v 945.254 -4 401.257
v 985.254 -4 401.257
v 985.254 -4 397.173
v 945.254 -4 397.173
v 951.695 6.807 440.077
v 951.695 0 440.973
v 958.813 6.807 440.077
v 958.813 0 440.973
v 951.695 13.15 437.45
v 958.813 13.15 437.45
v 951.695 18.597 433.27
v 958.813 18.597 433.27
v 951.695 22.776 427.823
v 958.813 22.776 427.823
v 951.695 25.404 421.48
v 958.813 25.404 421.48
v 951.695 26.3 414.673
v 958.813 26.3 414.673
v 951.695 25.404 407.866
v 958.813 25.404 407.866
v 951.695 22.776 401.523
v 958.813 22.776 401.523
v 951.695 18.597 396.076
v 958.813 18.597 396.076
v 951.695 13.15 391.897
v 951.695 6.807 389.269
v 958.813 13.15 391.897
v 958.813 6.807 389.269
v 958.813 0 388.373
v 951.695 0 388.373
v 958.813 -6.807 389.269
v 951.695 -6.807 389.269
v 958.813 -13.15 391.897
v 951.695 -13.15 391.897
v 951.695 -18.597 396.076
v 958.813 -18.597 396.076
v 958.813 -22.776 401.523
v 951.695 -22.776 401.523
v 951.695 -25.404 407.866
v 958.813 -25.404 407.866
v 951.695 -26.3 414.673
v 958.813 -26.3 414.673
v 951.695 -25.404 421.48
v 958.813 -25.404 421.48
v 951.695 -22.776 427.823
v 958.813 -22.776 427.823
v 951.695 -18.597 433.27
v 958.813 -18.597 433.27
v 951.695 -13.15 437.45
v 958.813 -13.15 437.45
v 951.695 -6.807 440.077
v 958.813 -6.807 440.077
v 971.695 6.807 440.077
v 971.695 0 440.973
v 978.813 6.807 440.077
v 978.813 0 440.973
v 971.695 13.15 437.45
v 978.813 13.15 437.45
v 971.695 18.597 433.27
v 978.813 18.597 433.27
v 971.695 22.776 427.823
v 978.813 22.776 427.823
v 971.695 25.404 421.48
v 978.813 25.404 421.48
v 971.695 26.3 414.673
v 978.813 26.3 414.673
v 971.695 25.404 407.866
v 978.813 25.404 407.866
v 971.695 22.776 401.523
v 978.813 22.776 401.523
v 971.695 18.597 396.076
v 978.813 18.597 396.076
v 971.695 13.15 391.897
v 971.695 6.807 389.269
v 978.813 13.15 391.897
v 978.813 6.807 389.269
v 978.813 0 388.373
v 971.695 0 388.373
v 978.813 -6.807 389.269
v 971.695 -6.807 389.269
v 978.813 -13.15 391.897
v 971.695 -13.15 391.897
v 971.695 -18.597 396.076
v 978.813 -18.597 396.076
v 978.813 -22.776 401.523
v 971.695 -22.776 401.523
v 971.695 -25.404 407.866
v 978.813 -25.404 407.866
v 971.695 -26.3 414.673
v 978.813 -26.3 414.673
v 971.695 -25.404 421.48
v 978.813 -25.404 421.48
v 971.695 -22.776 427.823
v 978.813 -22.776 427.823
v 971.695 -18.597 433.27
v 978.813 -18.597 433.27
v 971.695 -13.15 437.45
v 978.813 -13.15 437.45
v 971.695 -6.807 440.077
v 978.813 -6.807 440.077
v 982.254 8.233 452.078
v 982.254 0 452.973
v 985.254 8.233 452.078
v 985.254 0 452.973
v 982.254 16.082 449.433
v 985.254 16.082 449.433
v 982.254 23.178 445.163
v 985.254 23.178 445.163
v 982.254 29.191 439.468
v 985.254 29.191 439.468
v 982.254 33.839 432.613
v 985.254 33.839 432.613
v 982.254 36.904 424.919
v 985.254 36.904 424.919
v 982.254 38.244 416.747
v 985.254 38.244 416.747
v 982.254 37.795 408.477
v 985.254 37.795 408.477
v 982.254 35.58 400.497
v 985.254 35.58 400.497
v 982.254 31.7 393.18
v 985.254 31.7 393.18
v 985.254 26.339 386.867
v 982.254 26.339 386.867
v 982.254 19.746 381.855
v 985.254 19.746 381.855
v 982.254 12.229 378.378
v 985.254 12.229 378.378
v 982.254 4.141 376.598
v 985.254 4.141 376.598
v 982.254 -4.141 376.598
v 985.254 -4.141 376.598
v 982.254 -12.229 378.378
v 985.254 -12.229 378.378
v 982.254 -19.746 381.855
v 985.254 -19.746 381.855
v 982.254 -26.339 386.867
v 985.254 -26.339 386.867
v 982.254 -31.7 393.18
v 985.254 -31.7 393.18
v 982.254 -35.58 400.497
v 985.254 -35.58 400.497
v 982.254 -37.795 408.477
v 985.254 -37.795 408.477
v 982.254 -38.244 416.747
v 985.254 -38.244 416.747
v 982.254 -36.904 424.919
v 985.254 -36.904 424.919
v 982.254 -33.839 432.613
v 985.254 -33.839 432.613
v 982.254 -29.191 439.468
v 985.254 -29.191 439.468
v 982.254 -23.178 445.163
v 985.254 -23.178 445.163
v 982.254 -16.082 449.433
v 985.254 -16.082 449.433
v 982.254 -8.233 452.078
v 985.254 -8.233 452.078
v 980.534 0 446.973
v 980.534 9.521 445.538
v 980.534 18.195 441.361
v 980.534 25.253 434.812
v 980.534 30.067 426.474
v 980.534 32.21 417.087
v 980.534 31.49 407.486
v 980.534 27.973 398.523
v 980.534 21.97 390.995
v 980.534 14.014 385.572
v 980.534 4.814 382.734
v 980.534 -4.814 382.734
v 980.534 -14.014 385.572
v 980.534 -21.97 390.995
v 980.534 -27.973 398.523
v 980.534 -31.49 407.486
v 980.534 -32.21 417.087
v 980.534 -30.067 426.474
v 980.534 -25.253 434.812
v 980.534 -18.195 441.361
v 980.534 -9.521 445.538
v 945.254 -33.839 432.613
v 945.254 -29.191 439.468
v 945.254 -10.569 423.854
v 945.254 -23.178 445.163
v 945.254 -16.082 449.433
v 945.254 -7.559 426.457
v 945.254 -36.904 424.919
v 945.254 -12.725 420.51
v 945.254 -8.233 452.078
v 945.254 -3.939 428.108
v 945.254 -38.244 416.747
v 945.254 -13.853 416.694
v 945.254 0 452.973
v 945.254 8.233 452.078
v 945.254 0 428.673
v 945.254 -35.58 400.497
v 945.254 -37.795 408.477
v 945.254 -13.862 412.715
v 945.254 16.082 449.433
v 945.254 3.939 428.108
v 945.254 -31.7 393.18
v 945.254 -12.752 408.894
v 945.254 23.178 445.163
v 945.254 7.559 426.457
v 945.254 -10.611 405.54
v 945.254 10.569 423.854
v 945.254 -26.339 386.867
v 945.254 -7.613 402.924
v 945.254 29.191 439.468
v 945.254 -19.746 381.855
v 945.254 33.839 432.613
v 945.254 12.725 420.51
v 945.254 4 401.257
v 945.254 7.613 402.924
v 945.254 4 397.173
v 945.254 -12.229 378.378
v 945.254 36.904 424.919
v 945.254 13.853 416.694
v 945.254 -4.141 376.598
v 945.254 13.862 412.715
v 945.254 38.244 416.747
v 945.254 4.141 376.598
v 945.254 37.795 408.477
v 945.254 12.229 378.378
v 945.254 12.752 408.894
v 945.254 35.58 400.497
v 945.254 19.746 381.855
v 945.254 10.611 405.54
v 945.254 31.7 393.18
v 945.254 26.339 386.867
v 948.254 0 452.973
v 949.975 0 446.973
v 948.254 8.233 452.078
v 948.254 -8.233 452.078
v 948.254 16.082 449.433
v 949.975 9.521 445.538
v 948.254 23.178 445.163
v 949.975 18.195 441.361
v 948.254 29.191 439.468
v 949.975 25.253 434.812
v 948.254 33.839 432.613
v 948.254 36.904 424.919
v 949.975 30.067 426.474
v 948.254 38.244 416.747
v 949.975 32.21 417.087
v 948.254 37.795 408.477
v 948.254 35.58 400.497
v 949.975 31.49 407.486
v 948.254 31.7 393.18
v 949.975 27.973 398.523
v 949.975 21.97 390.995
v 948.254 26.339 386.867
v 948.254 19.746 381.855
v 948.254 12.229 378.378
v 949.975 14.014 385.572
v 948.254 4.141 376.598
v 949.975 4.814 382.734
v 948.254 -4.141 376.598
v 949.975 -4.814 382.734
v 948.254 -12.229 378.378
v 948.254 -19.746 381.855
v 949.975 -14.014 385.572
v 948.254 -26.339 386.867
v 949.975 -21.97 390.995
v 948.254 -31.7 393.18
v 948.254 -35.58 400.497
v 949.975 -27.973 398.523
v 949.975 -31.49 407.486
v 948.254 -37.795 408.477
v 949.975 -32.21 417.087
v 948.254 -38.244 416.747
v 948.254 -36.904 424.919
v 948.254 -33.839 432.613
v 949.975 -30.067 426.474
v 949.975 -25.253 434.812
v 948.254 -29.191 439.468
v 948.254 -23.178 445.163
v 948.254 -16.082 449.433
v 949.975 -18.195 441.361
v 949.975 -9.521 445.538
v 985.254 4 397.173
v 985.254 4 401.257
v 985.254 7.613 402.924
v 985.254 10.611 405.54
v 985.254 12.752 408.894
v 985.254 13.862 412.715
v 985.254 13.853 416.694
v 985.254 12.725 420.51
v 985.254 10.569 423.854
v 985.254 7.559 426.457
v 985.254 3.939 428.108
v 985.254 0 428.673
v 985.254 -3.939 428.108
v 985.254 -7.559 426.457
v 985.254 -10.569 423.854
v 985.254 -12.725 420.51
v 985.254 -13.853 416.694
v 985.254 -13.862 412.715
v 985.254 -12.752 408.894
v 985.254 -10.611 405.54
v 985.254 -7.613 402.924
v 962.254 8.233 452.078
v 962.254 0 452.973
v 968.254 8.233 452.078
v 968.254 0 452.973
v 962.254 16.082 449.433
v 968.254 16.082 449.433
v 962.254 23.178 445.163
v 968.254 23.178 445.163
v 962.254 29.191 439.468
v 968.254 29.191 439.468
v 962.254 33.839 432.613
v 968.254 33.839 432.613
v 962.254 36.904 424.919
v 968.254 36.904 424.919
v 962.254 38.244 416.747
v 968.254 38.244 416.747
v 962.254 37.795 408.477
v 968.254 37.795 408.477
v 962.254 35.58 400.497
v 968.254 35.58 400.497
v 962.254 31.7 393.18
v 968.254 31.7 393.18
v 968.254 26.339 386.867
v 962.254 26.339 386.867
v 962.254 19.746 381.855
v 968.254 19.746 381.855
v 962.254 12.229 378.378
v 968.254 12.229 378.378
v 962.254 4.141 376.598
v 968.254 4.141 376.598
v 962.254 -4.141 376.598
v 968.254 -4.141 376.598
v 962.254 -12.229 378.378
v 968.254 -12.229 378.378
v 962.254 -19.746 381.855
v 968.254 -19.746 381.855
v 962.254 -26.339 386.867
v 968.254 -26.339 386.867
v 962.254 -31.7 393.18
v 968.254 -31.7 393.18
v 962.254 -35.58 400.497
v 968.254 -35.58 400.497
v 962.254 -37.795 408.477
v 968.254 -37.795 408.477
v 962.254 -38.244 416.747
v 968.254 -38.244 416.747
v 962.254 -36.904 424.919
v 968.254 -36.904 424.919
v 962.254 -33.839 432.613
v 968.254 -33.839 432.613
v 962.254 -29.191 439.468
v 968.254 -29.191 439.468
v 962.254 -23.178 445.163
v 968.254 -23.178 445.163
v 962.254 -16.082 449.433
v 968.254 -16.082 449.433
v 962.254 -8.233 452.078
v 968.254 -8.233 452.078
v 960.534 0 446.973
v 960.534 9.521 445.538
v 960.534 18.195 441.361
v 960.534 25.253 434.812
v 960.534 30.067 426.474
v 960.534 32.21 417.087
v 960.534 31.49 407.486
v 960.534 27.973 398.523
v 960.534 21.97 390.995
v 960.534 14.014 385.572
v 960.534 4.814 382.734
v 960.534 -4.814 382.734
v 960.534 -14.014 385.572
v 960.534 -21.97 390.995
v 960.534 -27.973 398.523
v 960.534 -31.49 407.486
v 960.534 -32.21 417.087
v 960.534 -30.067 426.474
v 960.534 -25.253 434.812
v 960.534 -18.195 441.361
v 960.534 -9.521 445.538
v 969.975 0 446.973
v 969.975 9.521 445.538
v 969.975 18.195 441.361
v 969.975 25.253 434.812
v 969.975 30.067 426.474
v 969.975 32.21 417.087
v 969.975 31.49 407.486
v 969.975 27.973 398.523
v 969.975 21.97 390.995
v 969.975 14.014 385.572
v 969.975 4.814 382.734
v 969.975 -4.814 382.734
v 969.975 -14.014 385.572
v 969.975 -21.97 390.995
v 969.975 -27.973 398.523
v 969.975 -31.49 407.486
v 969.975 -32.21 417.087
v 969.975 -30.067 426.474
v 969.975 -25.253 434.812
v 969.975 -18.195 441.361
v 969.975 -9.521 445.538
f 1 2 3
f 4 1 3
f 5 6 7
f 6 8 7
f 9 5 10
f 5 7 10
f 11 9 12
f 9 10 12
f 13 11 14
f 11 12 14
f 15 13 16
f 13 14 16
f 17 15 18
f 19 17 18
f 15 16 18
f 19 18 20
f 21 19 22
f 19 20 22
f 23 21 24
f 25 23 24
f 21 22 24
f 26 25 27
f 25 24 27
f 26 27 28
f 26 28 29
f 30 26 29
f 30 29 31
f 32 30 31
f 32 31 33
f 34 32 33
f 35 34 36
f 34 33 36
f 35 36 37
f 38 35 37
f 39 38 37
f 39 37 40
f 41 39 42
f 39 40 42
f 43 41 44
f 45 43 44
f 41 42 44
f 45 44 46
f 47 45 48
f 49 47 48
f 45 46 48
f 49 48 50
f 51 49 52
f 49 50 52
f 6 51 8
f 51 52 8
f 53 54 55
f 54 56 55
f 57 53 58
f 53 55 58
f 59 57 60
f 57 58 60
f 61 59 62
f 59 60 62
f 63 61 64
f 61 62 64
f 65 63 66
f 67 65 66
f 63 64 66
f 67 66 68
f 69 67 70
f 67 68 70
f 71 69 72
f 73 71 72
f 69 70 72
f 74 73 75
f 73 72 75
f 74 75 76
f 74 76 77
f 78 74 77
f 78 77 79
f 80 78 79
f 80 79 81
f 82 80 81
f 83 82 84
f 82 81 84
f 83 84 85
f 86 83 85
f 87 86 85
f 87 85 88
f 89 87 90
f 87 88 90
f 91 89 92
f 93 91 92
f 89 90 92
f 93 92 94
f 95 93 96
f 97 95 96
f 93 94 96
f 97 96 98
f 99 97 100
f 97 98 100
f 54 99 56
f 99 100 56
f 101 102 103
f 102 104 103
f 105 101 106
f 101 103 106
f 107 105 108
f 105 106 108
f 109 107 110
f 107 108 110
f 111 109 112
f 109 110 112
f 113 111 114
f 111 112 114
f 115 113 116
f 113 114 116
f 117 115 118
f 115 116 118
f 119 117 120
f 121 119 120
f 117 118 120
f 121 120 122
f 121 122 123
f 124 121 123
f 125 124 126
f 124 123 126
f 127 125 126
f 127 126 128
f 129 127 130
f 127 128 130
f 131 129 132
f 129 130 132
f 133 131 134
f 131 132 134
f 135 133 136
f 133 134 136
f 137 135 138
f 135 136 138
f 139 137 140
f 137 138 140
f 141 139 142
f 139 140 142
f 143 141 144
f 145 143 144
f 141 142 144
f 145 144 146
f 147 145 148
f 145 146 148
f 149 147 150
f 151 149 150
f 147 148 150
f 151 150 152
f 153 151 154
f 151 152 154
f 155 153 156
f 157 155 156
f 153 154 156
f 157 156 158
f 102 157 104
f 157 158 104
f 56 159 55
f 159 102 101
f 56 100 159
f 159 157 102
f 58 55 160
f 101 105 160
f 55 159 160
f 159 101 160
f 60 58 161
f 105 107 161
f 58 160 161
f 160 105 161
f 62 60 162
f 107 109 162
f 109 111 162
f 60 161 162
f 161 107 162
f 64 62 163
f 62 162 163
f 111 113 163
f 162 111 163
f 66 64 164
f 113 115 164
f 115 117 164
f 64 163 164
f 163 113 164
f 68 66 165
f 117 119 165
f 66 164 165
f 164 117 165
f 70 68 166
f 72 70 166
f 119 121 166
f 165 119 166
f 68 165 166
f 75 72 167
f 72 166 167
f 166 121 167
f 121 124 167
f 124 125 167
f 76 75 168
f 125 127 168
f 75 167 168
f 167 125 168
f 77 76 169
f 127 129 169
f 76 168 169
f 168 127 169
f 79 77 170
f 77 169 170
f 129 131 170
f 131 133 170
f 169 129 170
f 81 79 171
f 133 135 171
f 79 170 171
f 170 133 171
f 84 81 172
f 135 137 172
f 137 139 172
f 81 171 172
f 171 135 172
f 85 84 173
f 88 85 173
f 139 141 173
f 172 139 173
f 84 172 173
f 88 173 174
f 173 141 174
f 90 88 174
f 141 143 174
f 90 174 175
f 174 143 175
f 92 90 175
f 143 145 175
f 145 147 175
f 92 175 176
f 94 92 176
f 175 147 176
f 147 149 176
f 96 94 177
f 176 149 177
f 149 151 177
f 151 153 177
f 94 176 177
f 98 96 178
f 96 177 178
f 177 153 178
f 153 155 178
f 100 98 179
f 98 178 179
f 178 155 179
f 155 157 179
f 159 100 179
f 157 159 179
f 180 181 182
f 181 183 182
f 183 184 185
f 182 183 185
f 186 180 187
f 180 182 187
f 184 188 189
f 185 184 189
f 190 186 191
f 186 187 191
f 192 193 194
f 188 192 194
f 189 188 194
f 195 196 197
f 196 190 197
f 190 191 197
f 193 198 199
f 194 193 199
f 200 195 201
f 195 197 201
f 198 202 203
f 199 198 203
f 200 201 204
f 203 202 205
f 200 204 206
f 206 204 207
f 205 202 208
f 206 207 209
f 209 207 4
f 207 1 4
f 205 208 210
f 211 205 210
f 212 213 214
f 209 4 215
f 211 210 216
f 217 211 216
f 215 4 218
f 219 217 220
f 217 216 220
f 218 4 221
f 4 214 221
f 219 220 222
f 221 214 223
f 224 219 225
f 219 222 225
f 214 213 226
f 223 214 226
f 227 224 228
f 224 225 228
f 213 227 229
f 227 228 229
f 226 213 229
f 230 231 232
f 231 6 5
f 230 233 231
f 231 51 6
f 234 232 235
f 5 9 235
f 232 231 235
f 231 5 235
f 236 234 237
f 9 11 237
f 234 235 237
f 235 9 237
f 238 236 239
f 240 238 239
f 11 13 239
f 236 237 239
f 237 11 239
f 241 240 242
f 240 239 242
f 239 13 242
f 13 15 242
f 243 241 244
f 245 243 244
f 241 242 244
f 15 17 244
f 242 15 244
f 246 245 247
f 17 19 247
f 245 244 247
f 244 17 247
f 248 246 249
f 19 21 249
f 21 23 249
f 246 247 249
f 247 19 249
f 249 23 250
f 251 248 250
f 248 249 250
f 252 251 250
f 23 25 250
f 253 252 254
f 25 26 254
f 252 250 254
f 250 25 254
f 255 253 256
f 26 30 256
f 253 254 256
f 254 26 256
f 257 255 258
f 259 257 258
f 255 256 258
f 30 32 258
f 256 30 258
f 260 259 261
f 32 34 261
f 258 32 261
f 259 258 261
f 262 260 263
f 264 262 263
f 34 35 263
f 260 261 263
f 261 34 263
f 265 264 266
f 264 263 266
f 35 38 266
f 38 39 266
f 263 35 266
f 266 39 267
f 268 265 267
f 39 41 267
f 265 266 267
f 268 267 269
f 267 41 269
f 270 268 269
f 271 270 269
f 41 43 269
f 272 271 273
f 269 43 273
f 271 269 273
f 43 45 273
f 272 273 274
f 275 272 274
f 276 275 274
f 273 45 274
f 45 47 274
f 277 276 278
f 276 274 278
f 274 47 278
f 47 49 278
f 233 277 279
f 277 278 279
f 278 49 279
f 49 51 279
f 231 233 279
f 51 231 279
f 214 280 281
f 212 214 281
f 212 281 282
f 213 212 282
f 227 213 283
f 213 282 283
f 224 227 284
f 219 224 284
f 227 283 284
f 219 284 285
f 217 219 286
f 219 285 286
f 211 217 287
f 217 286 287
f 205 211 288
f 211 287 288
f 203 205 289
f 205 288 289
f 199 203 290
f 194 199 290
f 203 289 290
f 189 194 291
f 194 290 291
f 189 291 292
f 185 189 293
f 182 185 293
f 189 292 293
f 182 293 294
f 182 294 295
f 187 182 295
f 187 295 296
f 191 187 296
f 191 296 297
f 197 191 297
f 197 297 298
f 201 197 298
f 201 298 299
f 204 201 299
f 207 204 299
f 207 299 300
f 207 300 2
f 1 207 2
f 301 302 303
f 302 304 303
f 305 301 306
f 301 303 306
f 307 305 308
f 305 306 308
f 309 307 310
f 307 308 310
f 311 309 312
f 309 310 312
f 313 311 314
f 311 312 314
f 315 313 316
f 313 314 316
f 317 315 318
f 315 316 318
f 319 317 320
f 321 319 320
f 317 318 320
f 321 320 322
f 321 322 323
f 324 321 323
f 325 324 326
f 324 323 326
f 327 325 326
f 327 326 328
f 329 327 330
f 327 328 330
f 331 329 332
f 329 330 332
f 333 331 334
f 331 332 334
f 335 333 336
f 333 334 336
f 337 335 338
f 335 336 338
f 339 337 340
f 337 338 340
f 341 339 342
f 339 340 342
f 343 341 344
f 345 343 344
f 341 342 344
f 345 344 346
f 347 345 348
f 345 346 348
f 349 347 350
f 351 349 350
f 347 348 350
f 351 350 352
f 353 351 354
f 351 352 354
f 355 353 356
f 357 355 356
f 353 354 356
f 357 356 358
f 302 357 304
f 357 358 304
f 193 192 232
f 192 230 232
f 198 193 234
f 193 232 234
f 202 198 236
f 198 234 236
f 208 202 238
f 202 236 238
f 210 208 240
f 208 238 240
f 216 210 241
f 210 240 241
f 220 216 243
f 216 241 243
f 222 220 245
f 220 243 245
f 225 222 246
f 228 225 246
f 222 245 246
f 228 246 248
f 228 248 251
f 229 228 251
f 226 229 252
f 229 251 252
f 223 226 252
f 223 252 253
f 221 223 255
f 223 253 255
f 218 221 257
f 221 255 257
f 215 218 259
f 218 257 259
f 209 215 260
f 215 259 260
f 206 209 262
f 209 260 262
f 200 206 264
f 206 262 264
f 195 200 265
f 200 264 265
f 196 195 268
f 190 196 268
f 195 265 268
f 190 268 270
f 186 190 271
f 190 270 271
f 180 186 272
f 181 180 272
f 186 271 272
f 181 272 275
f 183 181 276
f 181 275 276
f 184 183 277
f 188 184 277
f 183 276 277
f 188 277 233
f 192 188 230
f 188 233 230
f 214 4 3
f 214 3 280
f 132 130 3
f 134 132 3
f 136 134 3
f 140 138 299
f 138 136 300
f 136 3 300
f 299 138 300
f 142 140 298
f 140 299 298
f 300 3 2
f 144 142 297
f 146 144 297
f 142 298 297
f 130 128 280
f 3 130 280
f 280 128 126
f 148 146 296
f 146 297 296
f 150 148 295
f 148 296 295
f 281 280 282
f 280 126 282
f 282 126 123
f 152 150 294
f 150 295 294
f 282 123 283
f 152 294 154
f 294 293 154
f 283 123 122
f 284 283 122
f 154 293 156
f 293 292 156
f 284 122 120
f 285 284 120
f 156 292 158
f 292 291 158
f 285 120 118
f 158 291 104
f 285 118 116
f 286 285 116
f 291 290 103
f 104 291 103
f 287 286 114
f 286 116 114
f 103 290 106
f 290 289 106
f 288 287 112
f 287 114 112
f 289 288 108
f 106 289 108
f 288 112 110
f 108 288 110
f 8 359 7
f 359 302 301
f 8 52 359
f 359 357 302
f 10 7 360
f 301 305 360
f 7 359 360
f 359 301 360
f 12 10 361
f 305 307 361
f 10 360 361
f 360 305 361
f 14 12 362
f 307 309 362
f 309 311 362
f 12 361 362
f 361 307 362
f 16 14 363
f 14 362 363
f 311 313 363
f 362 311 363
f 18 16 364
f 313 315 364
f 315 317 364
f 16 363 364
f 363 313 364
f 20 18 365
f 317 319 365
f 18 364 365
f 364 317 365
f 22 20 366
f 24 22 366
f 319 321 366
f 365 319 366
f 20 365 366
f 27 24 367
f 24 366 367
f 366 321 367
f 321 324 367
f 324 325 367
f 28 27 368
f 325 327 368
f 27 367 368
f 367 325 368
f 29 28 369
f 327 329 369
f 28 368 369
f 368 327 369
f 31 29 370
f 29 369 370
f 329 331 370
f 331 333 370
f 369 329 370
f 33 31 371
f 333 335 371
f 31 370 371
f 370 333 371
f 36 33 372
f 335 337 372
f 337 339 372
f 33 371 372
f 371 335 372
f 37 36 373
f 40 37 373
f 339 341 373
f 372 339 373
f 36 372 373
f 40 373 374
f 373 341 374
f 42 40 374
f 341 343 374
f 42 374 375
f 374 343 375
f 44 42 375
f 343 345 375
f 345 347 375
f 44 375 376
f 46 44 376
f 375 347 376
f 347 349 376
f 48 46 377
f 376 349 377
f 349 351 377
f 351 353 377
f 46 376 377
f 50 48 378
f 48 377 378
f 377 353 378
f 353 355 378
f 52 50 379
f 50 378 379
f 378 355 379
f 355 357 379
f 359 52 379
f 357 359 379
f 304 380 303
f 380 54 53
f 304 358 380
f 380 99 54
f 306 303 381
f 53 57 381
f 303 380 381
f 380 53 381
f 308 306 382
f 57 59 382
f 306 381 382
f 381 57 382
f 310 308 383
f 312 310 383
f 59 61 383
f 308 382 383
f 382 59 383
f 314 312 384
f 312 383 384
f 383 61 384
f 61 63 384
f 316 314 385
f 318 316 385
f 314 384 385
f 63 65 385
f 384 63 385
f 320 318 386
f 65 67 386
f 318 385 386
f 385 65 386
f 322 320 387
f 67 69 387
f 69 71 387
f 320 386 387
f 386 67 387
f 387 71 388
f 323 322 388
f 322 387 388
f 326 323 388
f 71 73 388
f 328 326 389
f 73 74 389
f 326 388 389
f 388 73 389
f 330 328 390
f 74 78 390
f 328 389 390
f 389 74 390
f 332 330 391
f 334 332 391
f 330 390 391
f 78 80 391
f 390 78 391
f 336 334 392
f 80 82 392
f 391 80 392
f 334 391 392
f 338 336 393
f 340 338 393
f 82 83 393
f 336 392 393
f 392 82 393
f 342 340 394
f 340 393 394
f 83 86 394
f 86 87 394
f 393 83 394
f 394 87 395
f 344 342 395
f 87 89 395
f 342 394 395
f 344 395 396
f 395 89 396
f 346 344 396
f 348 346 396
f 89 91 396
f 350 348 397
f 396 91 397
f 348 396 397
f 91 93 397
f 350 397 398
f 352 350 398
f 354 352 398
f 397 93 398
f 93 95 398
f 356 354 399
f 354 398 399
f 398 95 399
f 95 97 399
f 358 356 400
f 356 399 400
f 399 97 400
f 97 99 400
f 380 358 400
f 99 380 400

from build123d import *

# Parameters (mm, degrees)
KES_EKSTR_ZYON1_DEPTH = 457.345778602
IZIM3_R               = 14
KES_EKSTR_ZYON2_DEPTH = 40
KES_EKSTR_ZYON3_DEPTH = 40


with BuildPart() as part:
    # Çizim1 → Döndür1 (revolve)
    with BuildSketch(Plane(origin=(0, 0, 414.673045167), x_dir=(-1, 0, 0), z_dir=(0, 0, -1)), mode=Mode.PRIVATE) as d_nd_r1_sk:
        Polygon((-985.254127108, 38.3), (-985.254127108, 0), (-945.254127108, 0), (-945.254127108, 38.3), (-948.254127108, 38.3), (-951.695071737, 26.3), (-958.813182479, 26.3), (-962.254127108, 38.3), (-968.254127108, 38.3), (-971.695071737, 26.3), (-978.813182479, 26.3), (-982.254127108, 38.3), align=None)
    revolve(d_nd_r1_sk.sketch.rotate(Axis((985.254127108, 0, 414.673045167), (-1, 0, 0)), 270), axis=Axis((985.254127108, 0, 414.673045167), (-1, 0, 0)))

    # Çizim2 → Kes-Ekstrüzyon1 (cut, through all)
    with BuildSketch(Plane.ZY.offset(-945.254127108)):
        with BuildLine():
            Line((405.659166978, 3), (402.173045167, 3))
            Line((402.173045167, 3), (402.173045167, -3))
            Line((402.173045167, -3), (405.659166978, -3))
            ThreePointArc((405.659166978, -3), (424.173045167, 0), (405.659166978, 3))
        make_face()
    extrude(amount=-KES_EKSTR_ZYON1_DEPTH, mode=Mode.SUBTRACT)

    # Çizim3 → Kes-Ekstrüzyon2 (cut)
    with BuildSketch(Plane(origin=(985.254127108, 0, 0), x_dir=(0, 0, -1), z_dir=(1, 0, 0))):
        with Locations((-414.673045167, 0)):
            Circle(IZIM3_R)
    extrude(amount=-KES_EKSTR_ZYON2_DEPTH, mode=Mode.SUBTRACT)

    # Çizim4 → Kes-Ekstrüzyon3 (cut)
    with BuildSketch(Plane(origin=(985.254127108, 0, 0), x_dir=(0, 0, -1), z_dir=(1, 0, 0))):
        Polygon((-400.673045167, 4), (-400.673045167, 0), (-400.673045167, -4), (-397.173045167, -4), (-397.173045167, 4), align=None)
        with BuildLine():
            ThreePointArc((-401.256637302, 4), (-400.819711451, 2.02117415), (-400.673045167, 0))
            Line((-400.673045167, 0), (-400.673045167, 4))
            Line((-400.673045167, 4), (-401.256637302, 4))
        make_face()
        with BuildLine():
            Line((-400.673045167, -4), (-400.673045167, 0))
            ThreePointArc((-400.673045167, 0), (-400.819711451, -2.02117415), (-401.256637302, -4))
            Line((-401.256637302, -4), (-400.673045167, -4))
        make_face()
    extrude(amount=-KES_EKSTR_ZYON3_DEPTH, mode=Mode.SUBTRACT)


solid = part.part
